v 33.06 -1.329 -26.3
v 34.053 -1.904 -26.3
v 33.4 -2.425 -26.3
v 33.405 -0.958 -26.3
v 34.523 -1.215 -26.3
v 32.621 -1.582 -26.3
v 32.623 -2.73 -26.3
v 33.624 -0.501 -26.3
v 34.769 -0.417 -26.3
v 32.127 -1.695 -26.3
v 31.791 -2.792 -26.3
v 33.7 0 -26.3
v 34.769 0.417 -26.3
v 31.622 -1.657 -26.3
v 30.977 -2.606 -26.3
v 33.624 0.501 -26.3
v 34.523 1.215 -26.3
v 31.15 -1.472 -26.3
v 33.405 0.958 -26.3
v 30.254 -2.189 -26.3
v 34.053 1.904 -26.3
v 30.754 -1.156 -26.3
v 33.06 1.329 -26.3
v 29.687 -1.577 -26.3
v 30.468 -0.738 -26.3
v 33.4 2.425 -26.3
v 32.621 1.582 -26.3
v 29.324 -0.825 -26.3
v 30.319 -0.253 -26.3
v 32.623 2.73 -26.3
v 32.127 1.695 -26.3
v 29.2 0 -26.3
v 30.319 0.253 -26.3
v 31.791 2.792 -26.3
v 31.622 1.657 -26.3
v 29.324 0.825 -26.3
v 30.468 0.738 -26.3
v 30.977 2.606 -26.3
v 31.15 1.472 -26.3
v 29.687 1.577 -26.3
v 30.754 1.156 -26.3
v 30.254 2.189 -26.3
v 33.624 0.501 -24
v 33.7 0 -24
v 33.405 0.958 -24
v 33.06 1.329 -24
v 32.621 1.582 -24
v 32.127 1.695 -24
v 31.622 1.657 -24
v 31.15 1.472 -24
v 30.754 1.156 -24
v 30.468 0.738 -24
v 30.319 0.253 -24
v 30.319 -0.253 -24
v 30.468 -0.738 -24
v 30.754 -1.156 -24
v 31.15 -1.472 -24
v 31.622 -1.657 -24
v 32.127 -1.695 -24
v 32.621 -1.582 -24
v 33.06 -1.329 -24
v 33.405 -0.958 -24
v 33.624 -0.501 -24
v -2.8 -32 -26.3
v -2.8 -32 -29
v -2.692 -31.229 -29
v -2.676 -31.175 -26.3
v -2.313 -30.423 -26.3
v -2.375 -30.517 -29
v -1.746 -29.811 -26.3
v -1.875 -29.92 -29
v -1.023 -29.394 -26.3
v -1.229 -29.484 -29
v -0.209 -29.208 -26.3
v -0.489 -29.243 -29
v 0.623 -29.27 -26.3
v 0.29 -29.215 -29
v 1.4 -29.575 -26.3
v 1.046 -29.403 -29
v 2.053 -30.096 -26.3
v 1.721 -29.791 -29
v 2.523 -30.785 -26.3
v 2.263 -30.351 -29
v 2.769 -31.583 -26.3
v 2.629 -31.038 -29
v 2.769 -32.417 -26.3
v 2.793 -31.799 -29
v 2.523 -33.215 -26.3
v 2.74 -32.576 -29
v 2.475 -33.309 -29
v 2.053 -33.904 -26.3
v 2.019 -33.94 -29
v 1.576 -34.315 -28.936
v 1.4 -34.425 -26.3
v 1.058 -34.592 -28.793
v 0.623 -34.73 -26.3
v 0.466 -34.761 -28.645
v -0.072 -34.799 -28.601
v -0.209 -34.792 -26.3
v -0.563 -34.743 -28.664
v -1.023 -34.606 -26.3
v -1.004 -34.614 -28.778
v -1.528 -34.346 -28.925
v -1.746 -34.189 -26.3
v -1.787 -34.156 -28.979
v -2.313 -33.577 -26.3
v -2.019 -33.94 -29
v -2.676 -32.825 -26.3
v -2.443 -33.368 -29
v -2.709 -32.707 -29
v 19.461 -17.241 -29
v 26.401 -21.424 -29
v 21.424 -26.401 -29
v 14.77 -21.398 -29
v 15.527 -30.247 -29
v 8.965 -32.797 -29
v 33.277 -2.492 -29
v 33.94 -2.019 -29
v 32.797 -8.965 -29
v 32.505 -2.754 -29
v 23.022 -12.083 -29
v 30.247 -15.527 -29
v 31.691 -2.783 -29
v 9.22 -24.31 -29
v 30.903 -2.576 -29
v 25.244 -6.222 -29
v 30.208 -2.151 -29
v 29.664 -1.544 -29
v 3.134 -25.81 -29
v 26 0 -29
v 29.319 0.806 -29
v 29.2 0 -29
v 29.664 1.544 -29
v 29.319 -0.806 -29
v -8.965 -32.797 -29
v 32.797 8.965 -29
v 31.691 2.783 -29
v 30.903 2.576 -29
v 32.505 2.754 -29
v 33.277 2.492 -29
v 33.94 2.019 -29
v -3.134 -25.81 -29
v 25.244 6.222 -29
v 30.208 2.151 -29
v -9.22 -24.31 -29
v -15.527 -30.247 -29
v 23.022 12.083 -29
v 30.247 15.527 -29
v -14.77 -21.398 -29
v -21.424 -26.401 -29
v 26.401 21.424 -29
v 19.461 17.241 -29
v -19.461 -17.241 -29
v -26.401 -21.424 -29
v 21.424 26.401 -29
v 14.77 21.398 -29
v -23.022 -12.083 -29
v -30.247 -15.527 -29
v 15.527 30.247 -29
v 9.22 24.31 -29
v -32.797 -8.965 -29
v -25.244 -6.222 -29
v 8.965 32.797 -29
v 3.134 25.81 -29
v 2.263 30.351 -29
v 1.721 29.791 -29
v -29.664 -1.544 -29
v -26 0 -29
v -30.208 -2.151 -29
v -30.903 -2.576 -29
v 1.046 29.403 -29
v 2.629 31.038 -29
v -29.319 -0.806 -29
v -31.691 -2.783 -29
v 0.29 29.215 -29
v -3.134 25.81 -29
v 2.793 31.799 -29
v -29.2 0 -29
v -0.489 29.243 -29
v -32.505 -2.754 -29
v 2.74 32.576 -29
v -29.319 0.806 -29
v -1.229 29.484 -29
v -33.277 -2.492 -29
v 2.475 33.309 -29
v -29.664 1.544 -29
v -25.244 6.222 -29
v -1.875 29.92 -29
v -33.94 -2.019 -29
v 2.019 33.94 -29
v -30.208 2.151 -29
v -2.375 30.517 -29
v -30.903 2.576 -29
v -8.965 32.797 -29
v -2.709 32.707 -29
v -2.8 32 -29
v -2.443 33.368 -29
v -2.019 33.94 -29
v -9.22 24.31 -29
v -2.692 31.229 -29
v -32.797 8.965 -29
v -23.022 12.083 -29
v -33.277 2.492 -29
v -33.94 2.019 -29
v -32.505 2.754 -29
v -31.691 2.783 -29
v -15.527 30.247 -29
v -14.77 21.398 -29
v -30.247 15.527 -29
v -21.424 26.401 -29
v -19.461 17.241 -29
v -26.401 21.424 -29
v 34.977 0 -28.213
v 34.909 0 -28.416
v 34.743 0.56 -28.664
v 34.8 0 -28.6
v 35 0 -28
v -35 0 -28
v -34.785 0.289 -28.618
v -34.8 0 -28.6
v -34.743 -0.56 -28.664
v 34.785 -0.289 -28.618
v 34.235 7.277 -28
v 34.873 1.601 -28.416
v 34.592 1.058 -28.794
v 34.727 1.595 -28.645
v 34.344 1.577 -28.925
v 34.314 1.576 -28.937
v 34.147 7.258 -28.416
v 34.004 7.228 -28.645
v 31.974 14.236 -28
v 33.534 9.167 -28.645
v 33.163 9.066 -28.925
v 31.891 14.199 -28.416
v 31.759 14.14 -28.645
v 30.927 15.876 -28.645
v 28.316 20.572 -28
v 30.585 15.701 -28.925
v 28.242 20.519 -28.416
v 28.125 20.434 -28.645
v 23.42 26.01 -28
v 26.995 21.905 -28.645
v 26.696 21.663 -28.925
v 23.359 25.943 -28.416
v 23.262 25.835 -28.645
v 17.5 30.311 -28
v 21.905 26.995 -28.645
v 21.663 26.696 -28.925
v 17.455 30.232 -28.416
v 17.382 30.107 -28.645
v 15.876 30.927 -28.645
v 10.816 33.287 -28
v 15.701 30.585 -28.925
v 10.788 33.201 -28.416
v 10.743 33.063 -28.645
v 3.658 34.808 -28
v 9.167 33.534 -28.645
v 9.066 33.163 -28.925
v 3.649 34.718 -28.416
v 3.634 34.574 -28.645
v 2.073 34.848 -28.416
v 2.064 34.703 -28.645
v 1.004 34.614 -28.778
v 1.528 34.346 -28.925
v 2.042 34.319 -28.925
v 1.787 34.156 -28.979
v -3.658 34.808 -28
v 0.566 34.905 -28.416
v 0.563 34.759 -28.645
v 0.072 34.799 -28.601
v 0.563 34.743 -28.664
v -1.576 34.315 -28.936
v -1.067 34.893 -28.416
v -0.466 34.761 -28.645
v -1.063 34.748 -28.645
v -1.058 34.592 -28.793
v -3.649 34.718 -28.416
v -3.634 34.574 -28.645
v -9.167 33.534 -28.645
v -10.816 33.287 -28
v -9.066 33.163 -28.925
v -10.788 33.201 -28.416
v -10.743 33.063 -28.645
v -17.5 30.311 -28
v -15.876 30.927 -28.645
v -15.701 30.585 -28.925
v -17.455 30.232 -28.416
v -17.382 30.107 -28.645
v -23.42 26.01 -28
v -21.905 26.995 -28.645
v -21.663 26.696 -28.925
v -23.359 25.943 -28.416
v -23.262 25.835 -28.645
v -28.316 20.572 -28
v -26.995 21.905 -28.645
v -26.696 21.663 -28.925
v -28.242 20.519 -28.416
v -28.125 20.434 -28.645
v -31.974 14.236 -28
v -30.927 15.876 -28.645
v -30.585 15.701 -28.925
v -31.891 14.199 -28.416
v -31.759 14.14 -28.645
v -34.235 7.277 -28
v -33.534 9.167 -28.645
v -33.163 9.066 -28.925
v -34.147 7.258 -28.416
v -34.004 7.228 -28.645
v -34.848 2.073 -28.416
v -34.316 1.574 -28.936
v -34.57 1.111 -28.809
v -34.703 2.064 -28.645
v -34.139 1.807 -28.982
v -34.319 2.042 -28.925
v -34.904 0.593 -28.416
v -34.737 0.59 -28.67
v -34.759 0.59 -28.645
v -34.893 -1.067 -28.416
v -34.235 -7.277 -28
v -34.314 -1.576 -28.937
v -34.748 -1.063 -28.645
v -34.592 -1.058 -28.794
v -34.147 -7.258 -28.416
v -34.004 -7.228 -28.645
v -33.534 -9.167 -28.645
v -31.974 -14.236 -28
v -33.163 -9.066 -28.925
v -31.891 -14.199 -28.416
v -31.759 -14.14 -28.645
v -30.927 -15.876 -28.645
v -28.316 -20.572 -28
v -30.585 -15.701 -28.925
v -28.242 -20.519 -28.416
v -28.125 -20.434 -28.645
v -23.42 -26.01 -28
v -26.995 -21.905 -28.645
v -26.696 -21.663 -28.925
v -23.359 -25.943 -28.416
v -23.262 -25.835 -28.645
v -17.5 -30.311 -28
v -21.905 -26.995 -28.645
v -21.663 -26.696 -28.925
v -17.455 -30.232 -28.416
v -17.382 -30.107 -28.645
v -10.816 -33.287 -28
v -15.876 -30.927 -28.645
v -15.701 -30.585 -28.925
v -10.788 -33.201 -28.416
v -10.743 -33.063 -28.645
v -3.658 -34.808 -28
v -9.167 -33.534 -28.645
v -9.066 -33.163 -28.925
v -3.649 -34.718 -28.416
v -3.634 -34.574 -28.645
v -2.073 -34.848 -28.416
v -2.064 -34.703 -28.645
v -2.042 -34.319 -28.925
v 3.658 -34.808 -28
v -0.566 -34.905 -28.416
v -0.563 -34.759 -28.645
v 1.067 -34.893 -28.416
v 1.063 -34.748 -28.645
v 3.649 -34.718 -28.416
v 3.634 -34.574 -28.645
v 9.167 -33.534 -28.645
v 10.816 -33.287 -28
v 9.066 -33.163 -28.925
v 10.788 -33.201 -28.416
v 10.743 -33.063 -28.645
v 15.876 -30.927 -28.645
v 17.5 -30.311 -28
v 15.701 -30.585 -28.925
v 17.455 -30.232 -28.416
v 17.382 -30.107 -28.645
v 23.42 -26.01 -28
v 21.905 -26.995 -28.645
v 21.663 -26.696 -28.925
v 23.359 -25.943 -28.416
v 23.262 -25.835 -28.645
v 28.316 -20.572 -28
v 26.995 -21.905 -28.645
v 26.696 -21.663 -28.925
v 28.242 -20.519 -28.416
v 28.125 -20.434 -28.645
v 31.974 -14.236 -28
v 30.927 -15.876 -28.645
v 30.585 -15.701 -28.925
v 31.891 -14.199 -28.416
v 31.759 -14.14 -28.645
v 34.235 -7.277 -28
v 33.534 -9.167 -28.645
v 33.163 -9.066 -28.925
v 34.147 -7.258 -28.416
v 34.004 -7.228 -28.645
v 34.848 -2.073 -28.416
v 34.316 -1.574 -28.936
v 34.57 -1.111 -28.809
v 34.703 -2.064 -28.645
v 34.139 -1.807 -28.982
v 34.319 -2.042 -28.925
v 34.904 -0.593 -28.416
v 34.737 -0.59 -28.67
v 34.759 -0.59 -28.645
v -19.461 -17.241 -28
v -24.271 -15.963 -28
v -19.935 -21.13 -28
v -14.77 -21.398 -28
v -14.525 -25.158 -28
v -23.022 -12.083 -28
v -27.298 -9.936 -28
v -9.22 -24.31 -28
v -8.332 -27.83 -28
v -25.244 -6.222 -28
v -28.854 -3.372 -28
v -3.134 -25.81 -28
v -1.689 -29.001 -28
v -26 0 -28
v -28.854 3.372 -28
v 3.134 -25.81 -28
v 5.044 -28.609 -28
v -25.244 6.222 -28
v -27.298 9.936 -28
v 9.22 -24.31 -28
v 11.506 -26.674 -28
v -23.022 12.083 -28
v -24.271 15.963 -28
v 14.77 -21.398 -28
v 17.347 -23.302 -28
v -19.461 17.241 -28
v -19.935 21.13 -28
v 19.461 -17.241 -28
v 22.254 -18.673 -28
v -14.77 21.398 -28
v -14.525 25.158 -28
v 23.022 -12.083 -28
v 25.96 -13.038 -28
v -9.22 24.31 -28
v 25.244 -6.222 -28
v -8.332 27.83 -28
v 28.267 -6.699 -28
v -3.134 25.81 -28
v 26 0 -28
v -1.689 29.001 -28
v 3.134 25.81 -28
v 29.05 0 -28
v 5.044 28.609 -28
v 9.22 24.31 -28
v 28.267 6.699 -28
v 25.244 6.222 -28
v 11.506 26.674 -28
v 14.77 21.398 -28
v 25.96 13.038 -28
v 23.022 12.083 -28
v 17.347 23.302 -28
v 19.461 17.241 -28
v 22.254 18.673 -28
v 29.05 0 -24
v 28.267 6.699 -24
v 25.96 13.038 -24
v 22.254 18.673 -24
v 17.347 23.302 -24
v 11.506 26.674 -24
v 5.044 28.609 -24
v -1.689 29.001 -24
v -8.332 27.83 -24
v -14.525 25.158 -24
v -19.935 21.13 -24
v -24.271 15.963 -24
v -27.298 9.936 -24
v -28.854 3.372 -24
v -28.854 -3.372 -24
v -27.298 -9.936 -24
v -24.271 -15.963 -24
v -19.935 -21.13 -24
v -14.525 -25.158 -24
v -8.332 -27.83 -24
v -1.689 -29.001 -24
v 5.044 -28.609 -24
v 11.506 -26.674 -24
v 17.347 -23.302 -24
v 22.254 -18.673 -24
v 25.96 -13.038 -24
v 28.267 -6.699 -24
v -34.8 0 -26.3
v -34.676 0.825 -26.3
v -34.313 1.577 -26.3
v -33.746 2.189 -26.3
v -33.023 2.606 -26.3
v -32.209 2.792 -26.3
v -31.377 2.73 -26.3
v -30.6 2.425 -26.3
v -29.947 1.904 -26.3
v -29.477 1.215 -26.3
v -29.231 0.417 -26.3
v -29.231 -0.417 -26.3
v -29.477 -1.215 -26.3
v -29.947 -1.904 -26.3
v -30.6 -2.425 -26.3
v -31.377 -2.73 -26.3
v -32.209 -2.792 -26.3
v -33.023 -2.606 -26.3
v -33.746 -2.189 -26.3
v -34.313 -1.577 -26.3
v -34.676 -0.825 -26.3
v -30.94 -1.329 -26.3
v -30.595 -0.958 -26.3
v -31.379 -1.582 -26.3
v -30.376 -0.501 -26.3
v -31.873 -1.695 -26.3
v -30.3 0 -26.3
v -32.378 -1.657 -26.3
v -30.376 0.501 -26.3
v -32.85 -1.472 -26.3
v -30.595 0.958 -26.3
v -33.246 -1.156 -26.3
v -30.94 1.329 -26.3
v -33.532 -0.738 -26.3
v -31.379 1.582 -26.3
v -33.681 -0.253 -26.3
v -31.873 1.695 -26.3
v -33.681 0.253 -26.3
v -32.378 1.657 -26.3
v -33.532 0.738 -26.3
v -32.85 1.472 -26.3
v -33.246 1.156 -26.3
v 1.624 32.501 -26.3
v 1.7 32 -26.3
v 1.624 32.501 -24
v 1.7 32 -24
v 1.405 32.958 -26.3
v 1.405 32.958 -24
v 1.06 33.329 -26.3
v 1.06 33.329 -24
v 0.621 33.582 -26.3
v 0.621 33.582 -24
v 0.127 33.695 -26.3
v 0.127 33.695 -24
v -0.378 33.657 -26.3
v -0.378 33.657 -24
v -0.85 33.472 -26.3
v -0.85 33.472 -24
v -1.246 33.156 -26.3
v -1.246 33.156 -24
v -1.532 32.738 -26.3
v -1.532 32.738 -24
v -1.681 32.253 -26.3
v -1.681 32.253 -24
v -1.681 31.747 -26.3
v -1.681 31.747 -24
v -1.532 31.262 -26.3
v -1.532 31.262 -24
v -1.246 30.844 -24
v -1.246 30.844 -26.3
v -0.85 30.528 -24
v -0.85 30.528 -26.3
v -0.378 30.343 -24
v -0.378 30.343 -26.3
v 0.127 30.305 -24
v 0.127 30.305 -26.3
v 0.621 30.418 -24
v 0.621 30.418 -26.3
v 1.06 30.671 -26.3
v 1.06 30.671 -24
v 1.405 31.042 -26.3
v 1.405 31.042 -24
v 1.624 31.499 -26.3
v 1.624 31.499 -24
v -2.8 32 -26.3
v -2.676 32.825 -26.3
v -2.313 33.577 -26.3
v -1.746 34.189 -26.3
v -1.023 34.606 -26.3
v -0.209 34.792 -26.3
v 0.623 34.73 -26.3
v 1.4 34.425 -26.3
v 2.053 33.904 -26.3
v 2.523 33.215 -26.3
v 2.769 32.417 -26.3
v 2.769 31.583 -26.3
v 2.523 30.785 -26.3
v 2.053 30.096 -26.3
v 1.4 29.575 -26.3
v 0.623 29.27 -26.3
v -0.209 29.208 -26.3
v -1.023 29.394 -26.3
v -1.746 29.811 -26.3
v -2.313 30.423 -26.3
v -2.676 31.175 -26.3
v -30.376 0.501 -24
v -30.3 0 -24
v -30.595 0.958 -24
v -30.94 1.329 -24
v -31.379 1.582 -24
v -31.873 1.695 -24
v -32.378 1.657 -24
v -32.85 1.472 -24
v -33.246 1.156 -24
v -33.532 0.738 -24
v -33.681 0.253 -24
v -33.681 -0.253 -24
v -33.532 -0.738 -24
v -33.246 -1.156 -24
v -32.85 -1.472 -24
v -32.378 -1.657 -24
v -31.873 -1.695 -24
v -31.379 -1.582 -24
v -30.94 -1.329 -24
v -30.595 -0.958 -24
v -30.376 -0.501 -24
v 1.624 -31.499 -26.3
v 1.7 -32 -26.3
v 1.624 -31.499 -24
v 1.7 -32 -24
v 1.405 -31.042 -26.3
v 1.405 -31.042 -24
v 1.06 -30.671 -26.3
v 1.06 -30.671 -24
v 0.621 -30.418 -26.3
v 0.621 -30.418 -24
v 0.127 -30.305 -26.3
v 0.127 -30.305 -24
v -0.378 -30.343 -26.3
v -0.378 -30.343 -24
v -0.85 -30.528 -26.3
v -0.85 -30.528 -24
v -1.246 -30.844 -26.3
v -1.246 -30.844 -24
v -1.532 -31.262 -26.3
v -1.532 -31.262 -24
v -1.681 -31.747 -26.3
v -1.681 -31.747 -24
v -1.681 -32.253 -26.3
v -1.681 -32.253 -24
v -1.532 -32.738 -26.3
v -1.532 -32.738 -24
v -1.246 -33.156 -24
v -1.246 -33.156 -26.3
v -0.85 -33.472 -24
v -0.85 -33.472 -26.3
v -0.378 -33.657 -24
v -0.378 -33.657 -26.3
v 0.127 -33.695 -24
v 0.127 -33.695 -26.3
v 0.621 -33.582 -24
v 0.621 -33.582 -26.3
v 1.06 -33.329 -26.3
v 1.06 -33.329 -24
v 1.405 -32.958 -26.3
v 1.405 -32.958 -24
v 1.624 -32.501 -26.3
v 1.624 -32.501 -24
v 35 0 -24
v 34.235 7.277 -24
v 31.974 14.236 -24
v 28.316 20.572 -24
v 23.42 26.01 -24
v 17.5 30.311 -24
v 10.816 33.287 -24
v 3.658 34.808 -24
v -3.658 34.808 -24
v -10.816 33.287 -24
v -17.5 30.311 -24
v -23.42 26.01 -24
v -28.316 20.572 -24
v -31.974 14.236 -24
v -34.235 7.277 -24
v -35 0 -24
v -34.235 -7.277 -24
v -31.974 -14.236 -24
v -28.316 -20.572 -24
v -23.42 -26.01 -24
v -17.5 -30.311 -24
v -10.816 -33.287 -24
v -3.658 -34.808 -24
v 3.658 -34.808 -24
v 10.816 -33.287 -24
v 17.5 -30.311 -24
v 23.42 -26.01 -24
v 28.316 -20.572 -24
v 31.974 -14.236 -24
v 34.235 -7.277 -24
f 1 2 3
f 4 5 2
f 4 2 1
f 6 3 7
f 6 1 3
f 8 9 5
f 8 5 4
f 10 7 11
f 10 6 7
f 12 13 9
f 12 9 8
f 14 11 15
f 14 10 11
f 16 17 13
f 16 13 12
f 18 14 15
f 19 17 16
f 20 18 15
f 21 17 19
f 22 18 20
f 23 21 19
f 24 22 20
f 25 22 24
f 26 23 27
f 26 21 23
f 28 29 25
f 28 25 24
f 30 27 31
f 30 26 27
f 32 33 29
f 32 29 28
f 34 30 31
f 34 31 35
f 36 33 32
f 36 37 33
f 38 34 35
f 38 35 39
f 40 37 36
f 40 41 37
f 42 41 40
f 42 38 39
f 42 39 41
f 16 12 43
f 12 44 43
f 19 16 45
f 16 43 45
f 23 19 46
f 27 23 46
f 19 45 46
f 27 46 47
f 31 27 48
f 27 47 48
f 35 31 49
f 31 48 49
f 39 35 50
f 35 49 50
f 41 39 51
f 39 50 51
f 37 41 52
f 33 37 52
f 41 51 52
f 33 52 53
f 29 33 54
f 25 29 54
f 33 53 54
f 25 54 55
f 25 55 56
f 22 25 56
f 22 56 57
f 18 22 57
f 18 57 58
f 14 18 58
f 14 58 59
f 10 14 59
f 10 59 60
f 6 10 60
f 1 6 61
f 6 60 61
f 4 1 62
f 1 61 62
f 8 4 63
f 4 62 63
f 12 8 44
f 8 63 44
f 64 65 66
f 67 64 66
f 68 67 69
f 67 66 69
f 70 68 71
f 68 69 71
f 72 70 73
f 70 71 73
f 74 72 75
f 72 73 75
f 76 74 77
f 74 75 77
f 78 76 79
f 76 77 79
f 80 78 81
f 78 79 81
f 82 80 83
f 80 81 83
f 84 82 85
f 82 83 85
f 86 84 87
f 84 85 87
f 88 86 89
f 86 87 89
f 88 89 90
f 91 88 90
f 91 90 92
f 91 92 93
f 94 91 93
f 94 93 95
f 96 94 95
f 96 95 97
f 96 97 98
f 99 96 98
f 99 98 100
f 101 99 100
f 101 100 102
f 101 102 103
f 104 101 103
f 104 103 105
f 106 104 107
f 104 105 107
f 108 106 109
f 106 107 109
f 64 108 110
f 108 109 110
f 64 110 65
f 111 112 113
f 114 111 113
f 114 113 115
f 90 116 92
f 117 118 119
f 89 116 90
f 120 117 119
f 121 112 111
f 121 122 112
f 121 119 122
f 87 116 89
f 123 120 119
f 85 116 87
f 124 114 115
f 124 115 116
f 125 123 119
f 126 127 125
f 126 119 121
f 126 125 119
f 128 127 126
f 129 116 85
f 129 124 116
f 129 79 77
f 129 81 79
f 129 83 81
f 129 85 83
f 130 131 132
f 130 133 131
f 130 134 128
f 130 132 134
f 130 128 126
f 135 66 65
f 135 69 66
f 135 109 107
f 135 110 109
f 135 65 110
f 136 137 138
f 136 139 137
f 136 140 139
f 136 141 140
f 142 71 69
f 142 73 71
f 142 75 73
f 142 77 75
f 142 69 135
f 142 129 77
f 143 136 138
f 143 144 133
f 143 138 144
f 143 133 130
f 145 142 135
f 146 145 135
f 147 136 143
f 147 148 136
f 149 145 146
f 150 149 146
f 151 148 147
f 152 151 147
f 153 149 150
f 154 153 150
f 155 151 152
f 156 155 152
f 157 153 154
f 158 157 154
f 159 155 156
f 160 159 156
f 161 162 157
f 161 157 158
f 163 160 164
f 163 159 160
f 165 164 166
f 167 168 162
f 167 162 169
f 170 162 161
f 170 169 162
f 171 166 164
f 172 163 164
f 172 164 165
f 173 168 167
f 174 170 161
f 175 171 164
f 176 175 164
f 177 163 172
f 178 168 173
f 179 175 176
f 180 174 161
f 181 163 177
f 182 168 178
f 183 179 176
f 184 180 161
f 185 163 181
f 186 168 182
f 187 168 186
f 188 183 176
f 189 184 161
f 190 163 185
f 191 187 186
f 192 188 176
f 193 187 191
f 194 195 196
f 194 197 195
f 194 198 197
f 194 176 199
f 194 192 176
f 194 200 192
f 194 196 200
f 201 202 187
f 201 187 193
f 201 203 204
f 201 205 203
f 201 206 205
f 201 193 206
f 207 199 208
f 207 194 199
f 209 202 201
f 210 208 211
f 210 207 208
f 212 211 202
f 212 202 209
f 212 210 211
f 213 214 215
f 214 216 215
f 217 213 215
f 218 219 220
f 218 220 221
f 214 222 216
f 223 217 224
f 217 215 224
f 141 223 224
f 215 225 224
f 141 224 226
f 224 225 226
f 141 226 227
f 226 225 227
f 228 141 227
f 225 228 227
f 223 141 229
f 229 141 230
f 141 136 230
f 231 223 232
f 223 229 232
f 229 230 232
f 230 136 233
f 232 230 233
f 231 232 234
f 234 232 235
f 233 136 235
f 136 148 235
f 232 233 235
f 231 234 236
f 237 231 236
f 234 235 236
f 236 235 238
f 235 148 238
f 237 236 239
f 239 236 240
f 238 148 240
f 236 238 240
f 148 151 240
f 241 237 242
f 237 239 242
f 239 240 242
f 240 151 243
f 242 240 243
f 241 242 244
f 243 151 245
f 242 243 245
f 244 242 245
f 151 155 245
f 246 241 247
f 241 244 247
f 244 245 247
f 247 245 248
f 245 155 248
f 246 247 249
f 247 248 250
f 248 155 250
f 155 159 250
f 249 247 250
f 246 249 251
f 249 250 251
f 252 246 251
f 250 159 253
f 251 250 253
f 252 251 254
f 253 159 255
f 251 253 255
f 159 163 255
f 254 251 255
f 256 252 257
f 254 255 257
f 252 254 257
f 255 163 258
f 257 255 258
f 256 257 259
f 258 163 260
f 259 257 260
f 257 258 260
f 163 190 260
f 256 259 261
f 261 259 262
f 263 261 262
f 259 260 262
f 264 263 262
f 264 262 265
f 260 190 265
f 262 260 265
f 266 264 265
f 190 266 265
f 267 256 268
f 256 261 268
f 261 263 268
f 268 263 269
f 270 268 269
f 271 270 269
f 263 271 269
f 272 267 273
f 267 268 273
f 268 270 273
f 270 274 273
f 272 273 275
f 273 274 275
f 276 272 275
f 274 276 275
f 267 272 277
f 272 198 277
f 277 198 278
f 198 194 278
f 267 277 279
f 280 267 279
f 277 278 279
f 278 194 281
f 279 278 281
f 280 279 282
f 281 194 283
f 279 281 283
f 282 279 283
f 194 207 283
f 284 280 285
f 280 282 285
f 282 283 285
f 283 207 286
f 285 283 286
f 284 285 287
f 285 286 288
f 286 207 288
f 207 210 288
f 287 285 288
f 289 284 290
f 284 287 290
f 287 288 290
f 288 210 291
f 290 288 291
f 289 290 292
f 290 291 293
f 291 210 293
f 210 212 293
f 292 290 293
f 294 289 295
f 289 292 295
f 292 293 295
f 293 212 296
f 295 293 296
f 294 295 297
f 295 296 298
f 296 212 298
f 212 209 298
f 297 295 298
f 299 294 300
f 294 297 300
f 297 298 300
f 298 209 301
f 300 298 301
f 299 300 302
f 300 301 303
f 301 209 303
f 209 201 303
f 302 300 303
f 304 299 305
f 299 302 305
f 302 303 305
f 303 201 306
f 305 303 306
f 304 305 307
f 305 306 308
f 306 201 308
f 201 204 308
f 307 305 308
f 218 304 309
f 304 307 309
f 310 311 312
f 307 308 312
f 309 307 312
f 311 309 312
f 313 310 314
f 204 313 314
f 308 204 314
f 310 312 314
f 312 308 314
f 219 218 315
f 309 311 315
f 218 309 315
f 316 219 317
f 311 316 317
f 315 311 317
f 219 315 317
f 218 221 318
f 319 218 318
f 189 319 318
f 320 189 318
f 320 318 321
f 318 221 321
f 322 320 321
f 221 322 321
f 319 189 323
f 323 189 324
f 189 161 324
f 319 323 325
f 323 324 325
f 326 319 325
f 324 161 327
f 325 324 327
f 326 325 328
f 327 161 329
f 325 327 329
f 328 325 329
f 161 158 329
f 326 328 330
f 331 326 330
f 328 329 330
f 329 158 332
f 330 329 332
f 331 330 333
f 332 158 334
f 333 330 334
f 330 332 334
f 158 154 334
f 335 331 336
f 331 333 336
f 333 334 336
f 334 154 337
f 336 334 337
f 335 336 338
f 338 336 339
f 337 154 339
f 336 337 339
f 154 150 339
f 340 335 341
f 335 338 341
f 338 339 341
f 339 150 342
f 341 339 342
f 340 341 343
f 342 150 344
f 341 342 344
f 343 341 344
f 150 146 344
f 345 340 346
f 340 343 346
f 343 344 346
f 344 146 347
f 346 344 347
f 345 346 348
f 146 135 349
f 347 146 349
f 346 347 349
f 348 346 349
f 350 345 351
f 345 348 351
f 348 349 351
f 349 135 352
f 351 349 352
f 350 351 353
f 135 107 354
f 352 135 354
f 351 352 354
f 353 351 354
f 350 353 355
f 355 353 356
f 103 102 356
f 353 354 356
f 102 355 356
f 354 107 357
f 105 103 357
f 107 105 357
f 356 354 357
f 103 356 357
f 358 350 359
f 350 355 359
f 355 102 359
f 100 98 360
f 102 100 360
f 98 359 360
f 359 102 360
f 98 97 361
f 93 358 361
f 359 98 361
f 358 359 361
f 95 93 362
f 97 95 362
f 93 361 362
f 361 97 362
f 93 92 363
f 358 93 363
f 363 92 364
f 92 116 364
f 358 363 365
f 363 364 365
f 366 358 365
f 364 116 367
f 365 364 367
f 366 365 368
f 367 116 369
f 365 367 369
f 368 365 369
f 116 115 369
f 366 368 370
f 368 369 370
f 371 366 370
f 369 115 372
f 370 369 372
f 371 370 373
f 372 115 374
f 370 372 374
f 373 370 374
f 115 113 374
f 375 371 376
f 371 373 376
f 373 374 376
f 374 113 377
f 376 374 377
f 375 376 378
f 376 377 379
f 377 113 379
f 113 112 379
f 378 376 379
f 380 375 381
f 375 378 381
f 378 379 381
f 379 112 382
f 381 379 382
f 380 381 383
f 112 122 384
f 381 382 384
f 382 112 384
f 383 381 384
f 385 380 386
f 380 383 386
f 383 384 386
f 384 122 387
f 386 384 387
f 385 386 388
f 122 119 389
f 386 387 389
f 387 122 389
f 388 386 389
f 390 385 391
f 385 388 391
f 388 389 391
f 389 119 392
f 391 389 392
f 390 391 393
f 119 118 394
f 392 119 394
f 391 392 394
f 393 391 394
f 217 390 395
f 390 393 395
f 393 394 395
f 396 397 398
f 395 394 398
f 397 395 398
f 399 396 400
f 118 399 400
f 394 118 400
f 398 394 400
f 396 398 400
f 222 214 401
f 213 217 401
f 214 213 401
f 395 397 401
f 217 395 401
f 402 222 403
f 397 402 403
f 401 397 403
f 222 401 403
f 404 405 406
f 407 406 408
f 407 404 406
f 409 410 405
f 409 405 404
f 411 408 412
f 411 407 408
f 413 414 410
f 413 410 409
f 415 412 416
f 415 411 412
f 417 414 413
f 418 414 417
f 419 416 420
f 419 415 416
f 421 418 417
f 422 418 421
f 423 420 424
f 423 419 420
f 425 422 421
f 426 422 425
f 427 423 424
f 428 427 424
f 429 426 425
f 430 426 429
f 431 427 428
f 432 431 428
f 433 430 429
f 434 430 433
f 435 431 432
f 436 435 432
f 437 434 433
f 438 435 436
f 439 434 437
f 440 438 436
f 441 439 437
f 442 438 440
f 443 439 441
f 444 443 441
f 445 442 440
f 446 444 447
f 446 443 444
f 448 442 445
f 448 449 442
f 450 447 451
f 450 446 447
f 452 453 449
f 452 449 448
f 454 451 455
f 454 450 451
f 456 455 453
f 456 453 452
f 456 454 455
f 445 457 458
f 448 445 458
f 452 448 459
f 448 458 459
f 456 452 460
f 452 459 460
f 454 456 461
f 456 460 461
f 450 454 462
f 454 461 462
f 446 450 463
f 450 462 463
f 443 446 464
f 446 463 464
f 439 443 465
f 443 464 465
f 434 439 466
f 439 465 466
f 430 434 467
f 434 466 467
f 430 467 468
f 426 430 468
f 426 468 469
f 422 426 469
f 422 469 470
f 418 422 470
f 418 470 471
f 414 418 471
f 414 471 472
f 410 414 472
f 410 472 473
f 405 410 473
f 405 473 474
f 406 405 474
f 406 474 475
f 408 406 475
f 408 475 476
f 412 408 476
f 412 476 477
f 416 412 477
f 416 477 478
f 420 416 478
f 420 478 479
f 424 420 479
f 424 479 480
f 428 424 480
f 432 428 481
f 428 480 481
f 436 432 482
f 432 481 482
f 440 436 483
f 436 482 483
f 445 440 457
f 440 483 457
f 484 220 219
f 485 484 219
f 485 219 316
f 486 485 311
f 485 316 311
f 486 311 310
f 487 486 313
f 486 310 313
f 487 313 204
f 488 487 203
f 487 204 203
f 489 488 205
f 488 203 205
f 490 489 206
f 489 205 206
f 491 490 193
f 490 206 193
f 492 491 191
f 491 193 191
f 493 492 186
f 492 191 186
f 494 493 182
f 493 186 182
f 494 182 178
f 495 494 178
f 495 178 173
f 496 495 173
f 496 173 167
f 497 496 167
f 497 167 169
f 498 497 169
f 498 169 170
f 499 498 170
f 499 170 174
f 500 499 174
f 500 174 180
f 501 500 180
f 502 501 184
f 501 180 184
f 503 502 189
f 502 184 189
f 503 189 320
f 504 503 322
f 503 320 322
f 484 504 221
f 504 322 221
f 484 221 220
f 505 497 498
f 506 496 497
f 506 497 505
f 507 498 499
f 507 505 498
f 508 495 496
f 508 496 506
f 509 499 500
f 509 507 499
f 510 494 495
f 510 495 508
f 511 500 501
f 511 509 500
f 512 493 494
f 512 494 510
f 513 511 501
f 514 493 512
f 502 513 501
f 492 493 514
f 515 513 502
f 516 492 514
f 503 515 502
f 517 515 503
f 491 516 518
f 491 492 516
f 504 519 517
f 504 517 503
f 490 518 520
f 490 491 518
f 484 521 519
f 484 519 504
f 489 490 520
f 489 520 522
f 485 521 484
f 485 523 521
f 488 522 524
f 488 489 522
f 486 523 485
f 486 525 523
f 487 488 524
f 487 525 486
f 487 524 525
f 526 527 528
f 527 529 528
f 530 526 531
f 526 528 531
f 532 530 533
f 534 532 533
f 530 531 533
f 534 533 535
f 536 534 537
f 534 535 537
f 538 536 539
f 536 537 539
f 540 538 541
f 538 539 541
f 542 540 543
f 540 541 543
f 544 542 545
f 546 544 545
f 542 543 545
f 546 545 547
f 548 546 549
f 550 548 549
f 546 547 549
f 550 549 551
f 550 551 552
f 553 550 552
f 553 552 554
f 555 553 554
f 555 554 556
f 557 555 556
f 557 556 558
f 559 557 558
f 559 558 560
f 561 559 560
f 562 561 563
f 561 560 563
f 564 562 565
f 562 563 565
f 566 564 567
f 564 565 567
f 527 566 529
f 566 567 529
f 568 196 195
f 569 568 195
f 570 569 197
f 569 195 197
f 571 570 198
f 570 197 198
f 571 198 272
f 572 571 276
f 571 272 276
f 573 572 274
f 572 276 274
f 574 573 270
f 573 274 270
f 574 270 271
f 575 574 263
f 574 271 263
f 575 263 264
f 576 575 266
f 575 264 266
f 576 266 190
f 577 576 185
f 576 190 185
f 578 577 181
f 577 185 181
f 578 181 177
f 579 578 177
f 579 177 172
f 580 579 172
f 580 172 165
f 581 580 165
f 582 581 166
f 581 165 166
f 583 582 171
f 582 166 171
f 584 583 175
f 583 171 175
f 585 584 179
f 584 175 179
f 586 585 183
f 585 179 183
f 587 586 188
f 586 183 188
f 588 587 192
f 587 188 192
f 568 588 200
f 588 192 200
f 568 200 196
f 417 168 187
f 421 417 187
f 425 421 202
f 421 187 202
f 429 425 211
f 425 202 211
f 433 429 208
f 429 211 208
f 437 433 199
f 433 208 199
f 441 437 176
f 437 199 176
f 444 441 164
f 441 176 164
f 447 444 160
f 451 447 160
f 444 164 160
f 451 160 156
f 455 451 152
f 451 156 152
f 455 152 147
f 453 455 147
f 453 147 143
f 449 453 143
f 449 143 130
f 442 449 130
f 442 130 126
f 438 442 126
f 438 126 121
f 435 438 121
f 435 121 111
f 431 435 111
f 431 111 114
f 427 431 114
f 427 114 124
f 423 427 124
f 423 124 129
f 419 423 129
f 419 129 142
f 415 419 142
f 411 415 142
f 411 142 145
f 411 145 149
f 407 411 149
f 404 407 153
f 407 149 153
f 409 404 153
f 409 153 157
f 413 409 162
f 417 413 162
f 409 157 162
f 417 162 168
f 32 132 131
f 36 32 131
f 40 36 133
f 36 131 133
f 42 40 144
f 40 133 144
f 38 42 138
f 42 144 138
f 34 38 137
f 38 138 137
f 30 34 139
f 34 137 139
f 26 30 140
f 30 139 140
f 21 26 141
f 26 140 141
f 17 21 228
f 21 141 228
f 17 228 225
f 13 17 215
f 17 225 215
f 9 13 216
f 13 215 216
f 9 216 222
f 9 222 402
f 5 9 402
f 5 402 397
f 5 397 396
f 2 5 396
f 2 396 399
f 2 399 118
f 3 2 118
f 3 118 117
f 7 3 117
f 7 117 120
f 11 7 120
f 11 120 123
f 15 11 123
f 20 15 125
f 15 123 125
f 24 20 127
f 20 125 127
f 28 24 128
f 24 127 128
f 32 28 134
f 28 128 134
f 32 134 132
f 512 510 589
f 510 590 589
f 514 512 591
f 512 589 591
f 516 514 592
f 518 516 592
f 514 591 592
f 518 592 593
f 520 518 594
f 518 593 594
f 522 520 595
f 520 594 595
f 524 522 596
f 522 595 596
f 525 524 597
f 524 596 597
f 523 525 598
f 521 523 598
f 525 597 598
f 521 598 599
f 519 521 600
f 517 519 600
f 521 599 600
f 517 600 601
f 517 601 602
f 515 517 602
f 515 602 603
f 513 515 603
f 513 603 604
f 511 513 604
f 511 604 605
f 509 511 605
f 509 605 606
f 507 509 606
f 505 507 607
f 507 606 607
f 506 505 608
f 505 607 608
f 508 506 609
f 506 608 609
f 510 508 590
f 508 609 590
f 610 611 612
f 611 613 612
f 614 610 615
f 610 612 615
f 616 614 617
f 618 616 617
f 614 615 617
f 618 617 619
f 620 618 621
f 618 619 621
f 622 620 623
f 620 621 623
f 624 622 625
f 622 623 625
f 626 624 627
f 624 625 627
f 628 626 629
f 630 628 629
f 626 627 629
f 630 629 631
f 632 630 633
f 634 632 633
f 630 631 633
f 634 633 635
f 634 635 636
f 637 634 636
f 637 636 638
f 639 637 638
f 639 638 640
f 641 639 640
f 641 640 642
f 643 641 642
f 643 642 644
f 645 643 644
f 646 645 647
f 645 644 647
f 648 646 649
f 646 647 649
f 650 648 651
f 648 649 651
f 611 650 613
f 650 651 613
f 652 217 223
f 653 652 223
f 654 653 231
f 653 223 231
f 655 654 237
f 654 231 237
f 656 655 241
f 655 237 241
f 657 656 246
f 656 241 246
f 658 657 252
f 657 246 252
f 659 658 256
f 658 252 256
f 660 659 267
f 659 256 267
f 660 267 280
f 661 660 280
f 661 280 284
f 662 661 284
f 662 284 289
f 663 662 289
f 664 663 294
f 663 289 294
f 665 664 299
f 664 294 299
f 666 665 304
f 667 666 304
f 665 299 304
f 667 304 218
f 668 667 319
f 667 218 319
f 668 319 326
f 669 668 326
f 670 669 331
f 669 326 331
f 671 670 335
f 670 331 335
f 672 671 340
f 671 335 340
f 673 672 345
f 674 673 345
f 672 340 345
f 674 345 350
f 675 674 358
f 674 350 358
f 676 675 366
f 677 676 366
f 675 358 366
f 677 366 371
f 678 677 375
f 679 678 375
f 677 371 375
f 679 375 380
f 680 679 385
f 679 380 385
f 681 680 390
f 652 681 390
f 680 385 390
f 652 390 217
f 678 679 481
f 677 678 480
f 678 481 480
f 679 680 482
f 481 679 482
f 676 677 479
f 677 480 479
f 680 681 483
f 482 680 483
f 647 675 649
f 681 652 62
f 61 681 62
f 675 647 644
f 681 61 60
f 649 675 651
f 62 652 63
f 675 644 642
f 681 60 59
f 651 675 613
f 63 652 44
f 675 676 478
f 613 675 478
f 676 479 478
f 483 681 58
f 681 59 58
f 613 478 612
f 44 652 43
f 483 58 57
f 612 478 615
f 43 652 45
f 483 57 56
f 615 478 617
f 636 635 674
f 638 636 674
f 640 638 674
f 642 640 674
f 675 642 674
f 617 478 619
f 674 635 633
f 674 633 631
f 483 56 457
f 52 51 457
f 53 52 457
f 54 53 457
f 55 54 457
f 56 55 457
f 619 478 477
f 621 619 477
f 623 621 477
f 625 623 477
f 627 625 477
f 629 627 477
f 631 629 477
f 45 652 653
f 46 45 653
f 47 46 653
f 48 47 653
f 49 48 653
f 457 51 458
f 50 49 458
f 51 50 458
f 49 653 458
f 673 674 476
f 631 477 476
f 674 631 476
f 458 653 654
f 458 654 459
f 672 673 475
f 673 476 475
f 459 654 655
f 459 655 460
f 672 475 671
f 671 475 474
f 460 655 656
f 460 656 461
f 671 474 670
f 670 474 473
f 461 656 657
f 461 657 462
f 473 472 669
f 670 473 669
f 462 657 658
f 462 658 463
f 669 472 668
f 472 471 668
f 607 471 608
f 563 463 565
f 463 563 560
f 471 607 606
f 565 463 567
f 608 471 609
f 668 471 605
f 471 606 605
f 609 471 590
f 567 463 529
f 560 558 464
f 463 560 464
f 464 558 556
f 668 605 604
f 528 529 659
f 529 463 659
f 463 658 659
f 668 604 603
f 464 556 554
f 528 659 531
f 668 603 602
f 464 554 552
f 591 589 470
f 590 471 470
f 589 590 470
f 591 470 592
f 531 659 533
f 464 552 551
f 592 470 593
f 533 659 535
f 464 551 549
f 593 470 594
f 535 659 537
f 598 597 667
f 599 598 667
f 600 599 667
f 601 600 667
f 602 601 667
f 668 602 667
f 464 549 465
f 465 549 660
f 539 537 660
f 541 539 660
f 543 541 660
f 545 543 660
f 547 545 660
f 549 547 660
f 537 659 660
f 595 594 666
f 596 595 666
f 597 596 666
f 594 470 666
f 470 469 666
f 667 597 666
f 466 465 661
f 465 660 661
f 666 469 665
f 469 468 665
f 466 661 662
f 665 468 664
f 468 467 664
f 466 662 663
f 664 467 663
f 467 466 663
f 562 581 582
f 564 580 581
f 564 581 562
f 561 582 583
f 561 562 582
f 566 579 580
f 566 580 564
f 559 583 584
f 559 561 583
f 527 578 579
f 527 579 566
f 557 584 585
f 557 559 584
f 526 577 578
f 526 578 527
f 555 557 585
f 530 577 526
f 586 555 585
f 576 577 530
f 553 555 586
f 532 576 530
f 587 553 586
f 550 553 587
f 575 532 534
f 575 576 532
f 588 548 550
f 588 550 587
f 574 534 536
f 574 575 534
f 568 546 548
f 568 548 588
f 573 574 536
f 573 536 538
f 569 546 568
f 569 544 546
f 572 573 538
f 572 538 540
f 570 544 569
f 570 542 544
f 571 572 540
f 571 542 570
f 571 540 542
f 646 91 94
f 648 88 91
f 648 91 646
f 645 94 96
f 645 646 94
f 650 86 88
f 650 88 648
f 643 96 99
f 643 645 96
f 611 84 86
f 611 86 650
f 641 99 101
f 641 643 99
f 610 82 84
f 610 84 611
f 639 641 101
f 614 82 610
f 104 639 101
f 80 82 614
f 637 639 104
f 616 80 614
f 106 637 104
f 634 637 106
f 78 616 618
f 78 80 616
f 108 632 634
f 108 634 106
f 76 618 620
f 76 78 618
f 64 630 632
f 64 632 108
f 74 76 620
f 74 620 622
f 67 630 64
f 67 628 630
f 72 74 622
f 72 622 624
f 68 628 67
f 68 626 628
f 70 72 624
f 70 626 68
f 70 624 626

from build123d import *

# Parameters (mm, degrees)
SKETCH_1_W                    = 35
SKETCH_1_H                    = 5
HOLE_WIZARD_3_4_3_4_1_D       = 3.4
HOLE_WIZARD_3_4_3_4_1_DEPTH   = 5
HOLE_WIZARD_M48_1_D           = 52
HOLE_WIZARD_M48_1_DEPTH       = 5
HOLE_WIZARD_M48_1_CBORE_D     = 58.1
HOLE_WIZARD_M48_1_CBORE_DEPTH = 4
FILLET_1_R                    = 1
SKETCH_17_R                   = 2.8
CUT_EXTRUDE_9_DEPTH           = 2.7


with BuildPart() as part:
    # 草图1 → 旋转1 (revolve)
    with BuildSketch(Plane(origin=(0, 0, 0), x_dir=(1, 0, 0), z_dir=(0, 1, 0))):
        with Locations((17.5, 26.5)):
            Rectangle(SKETCH_1_W, SKETCH_1_H)
    revolve(axis=Axis((0, 0, -29), (0, 0, 1)))

    # Ø3.4 (3.4) 直径孔1
    with Locations(Plane(origin=(0, 0, -29), x_dir=(-1, 0, 0), z_dir=(0, 0, -1))):
        with Locations((0, -32), (-32, 0), (0, 32), (32, 0)):
            Hole(HOLE_WIZARD_3_4_3_4_1_D / 2, depth=HOLE_WIZARD_3_4_3_4_1_DEPTH)

    # M48 六角头螺栓的柱形沉头孔1
    with Locations(Plane.XY.offset(-24)):
        with Locations((0, 0)):
            CounterBoreHole(HOLE_WIZARD_M48_1_D / 2, HOLE_WIZARD_M48_1_CBORE_D / 2, HOLE_WIZARD_M48_1_CBORE_DEPTH, depth=HOLE_WIZARD_M48_1_DEPTH)

    # 圆角1
    fillet_1_edges = [part.edges().sort_by_distance(p)[0] for p in [
        (-35, 0, -29),
    ]]
    fillet(fillet_1_edges, radius=FILLET_1_R)

    # 草图17 → 切除-拉伸9 (cut)
    with BuildSketch(Plane(origin=(0, 0, -29), x_dir=(-1, 0, 0), z_dir=(0, 0, -1))):
        with Locations((0, -32)):
            Circle(SKETCH_17_R)
        with Locations((-32, 0)):
            Circle(SKETCH_17_R)
        with Locations((0, 32)):
            Circle(SKETCH_17_R)
        with Locations((32, 0)):
            Circle(SKETCH_17_R)
    extrude(amount=-CUT_EXTRUDE_9_DEPTH, mode=Mode.SUBTRACT)


solid = part.part
